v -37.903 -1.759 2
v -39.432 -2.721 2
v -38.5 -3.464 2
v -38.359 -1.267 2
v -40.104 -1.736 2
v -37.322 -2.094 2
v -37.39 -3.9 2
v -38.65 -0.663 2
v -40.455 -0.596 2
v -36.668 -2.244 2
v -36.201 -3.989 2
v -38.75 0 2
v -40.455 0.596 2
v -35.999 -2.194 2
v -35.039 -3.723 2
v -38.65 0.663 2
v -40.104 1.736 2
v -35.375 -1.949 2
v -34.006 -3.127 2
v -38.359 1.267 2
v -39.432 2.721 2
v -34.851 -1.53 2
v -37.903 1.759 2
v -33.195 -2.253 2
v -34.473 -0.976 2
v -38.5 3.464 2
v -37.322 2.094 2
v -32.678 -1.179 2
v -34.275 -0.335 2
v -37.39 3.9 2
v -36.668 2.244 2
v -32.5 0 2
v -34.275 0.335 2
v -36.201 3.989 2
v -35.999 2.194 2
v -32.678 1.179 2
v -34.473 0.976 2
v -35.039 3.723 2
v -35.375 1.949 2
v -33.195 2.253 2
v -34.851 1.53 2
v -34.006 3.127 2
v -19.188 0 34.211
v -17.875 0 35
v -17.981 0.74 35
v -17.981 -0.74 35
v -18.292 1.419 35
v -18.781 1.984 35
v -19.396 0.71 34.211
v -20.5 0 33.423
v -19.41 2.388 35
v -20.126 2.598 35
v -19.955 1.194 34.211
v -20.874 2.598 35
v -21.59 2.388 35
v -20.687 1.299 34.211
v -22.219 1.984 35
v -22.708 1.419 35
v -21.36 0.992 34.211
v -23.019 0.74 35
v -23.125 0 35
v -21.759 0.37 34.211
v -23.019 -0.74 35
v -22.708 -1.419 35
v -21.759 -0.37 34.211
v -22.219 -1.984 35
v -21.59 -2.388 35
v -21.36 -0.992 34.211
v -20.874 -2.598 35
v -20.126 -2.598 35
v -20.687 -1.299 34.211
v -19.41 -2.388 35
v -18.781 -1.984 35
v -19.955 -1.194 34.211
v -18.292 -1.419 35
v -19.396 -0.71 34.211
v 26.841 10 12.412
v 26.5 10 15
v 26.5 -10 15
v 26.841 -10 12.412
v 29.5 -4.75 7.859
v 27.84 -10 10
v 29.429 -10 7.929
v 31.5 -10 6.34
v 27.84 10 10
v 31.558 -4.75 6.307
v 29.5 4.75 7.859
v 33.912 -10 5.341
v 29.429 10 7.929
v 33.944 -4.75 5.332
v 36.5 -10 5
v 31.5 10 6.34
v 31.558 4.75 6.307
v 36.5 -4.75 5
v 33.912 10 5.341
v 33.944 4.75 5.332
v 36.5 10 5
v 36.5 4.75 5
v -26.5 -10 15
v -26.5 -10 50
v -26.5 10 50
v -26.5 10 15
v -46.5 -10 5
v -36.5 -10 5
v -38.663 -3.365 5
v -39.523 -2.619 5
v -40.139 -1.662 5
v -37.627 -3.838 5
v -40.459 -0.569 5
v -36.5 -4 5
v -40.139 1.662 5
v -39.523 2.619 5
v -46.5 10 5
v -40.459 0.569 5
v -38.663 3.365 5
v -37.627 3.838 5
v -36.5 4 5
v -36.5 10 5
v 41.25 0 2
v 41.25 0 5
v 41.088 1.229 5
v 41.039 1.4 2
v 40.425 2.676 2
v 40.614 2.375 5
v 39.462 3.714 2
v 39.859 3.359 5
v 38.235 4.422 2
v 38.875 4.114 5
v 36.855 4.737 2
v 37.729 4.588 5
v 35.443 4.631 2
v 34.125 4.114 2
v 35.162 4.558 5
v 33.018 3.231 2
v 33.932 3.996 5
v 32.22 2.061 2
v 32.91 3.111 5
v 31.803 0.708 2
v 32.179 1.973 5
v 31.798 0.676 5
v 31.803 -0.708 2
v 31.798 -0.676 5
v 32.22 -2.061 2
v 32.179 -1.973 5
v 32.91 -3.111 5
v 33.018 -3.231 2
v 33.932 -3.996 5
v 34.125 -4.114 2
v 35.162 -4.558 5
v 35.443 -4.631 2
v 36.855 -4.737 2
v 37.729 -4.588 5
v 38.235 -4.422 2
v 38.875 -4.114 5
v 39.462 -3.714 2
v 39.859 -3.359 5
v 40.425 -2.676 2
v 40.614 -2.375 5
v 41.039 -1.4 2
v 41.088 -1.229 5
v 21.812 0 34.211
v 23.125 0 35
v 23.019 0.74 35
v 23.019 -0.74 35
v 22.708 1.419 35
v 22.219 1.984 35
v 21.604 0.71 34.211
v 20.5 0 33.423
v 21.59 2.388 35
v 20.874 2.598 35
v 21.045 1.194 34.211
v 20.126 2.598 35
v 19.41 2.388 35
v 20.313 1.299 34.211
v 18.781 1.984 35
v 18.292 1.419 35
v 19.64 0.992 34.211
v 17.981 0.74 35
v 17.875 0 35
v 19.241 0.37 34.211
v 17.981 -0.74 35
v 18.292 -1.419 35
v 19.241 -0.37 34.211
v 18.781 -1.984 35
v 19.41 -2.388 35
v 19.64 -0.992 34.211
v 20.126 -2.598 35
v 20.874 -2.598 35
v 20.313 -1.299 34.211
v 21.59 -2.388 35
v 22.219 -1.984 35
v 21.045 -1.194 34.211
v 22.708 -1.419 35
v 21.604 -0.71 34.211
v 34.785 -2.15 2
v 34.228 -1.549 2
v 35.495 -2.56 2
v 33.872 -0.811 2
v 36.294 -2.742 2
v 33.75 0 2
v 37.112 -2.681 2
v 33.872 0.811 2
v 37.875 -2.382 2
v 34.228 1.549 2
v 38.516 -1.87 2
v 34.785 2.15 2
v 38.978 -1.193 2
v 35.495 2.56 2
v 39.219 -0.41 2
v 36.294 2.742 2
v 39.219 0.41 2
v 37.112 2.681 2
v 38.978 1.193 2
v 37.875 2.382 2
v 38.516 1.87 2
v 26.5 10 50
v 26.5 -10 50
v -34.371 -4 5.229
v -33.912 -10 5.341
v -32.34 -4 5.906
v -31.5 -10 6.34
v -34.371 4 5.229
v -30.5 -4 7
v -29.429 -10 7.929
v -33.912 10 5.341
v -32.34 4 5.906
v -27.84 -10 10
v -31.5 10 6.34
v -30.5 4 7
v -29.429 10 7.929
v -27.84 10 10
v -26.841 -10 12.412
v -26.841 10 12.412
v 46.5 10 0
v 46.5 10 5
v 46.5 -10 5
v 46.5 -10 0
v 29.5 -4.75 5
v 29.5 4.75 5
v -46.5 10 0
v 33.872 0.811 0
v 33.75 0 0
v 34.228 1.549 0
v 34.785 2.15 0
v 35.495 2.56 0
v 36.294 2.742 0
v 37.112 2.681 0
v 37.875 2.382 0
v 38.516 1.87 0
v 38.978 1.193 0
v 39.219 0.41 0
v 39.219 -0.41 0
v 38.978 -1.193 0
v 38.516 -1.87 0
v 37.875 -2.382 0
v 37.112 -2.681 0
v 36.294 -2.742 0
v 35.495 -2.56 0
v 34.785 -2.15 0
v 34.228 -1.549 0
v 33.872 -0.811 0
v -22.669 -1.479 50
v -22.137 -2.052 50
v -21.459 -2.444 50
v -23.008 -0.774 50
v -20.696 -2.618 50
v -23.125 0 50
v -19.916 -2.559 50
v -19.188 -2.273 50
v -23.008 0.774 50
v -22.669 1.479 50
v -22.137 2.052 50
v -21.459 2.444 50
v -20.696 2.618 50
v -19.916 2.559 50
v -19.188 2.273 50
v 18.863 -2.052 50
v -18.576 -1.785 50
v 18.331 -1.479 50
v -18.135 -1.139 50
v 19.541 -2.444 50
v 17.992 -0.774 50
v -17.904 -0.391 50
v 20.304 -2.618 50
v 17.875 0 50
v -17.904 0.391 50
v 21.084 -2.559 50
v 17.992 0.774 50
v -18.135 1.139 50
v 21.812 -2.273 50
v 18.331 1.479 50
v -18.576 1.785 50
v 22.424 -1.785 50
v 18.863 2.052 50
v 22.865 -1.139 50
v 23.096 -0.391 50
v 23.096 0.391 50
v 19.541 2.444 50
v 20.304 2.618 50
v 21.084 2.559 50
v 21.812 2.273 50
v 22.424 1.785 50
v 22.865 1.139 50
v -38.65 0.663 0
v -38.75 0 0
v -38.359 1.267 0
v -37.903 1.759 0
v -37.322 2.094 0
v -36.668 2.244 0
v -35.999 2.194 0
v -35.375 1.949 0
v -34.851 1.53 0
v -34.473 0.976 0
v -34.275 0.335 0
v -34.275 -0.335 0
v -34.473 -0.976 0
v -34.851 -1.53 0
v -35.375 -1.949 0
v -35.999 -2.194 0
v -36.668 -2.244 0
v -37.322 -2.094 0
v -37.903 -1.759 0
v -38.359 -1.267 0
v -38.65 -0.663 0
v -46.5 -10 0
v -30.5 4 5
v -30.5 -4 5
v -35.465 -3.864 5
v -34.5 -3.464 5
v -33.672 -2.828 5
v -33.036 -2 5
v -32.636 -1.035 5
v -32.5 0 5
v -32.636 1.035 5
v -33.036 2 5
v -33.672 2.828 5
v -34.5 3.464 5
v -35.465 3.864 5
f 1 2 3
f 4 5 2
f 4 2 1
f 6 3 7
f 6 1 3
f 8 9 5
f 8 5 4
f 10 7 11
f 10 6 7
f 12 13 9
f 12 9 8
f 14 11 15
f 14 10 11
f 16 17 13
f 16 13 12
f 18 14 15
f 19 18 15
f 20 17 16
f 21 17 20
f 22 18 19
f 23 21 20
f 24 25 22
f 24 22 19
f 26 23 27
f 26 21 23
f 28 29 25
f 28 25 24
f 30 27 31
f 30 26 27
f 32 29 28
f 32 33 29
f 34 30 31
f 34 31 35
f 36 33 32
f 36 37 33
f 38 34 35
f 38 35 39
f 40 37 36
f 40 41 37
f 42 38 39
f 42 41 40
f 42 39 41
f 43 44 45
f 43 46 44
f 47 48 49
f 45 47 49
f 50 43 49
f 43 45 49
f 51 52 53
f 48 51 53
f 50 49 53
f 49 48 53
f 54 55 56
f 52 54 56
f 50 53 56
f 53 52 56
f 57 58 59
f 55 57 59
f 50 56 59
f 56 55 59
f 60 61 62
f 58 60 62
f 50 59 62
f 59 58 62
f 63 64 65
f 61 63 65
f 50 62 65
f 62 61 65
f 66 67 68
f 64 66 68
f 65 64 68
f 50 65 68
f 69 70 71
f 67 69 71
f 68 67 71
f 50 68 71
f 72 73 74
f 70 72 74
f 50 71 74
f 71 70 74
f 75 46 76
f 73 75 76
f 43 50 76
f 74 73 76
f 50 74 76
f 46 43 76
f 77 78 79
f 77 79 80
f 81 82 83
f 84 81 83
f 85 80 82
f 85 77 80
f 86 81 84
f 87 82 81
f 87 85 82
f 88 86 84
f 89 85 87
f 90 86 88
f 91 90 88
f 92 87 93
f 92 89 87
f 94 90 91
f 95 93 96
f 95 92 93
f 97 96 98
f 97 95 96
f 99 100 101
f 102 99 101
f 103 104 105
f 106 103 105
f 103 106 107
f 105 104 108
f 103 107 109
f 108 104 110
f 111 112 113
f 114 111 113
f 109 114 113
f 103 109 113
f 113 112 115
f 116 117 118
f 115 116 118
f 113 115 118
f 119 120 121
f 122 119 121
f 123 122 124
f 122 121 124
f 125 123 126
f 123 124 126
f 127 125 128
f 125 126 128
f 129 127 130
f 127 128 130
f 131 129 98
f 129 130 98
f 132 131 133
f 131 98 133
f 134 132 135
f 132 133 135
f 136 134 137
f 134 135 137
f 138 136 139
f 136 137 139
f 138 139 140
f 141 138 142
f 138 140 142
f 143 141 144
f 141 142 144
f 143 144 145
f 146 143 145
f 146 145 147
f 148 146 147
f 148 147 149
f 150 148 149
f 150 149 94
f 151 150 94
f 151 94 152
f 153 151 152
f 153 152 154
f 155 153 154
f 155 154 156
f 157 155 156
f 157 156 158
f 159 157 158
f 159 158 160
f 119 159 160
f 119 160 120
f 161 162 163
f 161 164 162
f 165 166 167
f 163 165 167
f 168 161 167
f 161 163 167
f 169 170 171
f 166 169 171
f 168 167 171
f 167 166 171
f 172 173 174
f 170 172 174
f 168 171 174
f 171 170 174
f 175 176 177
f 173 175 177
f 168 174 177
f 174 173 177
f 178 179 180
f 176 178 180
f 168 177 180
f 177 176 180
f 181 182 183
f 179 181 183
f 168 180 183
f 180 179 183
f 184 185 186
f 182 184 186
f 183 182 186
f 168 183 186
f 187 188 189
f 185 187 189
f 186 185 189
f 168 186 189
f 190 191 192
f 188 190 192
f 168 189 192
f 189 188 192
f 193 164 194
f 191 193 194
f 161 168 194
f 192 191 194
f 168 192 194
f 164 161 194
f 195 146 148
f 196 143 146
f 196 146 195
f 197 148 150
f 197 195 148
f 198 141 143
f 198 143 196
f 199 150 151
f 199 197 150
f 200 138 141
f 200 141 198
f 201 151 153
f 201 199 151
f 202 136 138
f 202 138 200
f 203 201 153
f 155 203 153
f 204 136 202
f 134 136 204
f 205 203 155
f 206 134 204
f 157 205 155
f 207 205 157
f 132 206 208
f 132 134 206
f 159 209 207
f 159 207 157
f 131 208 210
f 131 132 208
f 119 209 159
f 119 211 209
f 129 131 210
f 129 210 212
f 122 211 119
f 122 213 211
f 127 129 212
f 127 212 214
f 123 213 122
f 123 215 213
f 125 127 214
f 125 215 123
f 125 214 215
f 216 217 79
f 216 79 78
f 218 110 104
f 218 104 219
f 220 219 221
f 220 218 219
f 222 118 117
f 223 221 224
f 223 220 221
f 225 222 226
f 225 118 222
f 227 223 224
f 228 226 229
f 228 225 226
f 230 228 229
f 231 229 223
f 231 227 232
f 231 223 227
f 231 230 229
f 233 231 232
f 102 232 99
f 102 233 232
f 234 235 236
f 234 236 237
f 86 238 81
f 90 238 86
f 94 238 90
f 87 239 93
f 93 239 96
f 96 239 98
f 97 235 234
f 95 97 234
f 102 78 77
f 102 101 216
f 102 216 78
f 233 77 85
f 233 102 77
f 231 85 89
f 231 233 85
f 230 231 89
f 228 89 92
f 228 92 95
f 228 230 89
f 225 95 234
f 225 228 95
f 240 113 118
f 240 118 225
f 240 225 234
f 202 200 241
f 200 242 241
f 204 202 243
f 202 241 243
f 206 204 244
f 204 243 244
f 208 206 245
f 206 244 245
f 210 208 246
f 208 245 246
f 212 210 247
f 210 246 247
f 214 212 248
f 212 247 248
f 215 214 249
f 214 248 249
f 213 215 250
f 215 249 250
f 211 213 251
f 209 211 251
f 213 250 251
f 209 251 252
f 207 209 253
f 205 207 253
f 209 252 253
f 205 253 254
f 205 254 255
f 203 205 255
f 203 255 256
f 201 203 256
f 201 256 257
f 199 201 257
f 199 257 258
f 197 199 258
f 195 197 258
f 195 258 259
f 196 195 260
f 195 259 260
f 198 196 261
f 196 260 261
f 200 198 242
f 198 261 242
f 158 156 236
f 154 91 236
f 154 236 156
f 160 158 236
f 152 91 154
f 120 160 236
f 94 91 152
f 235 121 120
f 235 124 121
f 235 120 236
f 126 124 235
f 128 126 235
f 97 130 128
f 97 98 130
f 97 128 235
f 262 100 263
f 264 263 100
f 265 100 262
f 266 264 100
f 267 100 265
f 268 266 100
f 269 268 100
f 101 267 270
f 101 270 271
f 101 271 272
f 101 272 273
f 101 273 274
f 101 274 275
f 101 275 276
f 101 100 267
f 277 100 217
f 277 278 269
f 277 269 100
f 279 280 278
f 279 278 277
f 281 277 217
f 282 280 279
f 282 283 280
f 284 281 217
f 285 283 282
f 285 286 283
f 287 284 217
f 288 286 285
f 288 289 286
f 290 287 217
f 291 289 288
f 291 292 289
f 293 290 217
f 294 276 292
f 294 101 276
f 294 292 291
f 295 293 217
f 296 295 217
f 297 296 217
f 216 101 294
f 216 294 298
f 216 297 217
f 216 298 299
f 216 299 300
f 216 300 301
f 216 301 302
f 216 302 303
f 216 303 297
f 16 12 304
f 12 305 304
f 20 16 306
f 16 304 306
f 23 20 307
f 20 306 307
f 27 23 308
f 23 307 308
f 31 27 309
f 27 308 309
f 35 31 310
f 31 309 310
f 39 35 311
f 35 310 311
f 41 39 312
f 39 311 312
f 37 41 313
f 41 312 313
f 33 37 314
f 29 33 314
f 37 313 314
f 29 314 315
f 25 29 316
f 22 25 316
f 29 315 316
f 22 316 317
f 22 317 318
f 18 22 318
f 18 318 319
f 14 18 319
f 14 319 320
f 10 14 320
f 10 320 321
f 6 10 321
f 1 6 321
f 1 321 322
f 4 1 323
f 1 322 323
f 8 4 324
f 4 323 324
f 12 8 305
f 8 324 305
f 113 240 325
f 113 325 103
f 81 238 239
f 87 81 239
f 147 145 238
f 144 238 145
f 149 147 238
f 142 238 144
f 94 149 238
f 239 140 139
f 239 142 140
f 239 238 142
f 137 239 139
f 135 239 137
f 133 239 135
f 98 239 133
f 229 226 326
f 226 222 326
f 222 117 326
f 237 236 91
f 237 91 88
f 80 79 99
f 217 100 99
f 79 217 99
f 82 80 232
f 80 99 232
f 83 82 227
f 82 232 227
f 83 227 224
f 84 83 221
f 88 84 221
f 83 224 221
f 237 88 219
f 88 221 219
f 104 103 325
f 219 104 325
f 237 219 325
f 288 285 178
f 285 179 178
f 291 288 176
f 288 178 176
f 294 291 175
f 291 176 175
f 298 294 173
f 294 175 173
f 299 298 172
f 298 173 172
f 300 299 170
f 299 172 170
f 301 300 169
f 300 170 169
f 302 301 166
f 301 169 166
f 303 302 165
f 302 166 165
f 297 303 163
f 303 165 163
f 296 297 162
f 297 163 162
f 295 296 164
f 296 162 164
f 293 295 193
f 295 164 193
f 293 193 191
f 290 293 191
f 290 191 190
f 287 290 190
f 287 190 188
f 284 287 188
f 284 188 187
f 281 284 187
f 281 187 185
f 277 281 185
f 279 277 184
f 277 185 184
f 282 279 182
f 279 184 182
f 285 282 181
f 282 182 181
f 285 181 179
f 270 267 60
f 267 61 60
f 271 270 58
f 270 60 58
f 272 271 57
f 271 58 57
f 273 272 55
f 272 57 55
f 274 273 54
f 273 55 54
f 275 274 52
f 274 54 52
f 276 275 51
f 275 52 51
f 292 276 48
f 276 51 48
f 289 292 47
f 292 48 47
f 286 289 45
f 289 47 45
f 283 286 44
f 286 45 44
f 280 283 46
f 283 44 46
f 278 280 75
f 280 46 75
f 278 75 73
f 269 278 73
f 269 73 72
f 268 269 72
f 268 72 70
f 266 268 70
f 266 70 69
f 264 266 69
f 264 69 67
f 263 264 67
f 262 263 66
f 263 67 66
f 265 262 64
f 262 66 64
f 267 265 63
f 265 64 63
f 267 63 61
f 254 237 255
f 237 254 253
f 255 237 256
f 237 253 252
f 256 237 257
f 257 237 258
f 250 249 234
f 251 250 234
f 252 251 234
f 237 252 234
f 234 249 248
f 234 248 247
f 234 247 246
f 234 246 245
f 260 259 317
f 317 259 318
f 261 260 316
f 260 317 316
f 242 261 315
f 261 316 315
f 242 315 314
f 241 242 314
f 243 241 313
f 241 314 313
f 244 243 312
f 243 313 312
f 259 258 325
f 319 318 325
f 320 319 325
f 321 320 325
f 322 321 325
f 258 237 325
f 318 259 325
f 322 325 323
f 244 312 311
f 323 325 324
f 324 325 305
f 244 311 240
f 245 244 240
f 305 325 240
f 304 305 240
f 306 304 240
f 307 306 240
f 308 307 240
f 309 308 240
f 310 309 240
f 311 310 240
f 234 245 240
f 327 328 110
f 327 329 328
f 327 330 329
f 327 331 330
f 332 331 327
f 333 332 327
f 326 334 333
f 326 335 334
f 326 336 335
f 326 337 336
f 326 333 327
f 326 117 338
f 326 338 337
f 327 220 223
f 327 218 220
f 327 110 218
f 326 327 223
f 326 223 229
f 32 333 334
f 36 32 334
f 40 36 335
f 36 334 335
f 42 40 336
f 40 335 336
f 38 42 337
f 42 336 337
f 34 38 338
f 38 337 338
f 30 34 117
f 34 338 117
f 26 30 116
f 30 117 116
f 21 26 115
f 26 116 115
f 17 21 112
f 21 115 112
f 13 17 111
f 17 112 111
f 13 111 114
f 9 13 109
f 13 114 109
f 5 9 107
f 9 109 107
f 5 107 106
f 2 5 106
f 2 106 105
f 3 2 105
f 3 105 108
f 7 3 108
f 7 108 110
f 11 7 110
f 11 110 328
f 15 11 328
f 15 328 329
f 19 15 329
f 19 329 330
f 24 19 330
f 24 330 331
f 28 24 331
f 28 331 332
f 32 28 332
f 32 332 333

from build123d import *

# Parameters (mm, degrees)
SKETCH_1_W                     = 53
SKETCH_1_H                     = 20
EXTRUDE_1_DEPTH                = 50
HOLE_WIZARD_M5_1_D             = 5.25
HOLE_WIZARD_M5_1_DEPTH         = 15
HOLE_WIZARD_M5_1_TIP           = 1.577259125
SKETCH_4_W                     = 5
SKETCH_4_H                     = 20
EXTRUDE_2_DEPTH                = 20
HOLE_WIZARD_M4_1_D             = 4.5
HOLE_WIZARD_M4_1_DEPTH         = 15
HOLE_WIZARD_M4_1_CBORE_D       = 8
HOLE_WIZARD_M4_1_CBORE_DEPTH   = 3
HOLE_WIZARD_M4_1_TIP           = 1.351936393
SKETCH_7_W                     = 5
SKETCH_7_H                     = 20
EXTRUDE_3_DEPTH                = 20
HOLE_WIZARD_M5_1_2_D           = 5.5
HOLE_WIZARD_M5_1_2_DEPTH       = 15
HOLE_WIZARD_M5_1_2_CBORE_D     = 9.5
HOLE_WIZARD_M5_1_2_CBORE_DEPTH = 3
HOLE_WIZARD_M5_1_2_TIP         = 1.652366702
FILLET_1_R                     = 10
SKETCH_10_W                    = 6
SKETCH_10_H                    = 8
SKETCH_10_W_2                  = 7
SKETCH_10_H_2                  = 9.5
CUT_EXTRUDE_1_DEPTH            = 20


with BuildPart() as part:
    # 스케치1 → 보스-돌출1 (new body)
    with BuildSketch(Plane.XY):
        Rectangle(SKETCH_1_W, SKETCH_1_H)
    extrude(amount=EXTRUDE_1_DEPTH)

    # Hole Wizard M5 _ _1
    with Locations(Plane.XY.offset(50)):
        with Locations((20.5, 0), (-20.5, 0)):
            Hole(HOLE_WIZARD_M5_1_D / 2, depth=HOLE_WIZARD_M5_1_DEPTH)
            with Locations((0, 0, -(HOLE_WIZARD_M5_1_DEPTH + HOLE_WIZARD_M5_1_TIP / 2))):  # 118° drill point
                Cone(0, HOLE_WIZARD_M5_1_D / 2, HOLE_WIZARD_M5_1_TIP, mode=Mode.SUBTRACT)

    # 스케치4 → 보스-돌출2 (add)
    with BuildSketch(Plane.ZY.offset(26.5)):
        with Locations((2.5, 0)):
            Rectangle(SKETCH_4_W, SKETCH_4_H)
    extrude(amount=EXTRUDE_2_DEPTH)

    # M4 소켓 머리 캡 나사용 카운터보어1
    with Locations(Plane.XY.offset(5)):
        with Locations((-36.5, 0)):
            CounterBoreHole(HOLE_WIZARD_M4_1_D / 2, HOLE_WIZARD_M4_1_CBORE_D / 2, HOLE_WIZARD_M4_1_CBORE_DEPTH, depth=HOLE_WIZARD_M4_1_DEPTH)
            with Locations((0, 0, -(HOLE_WIZARD_M4_1_DEPTH + HOLE_WIZARD_M4_1_TIP / 2))):  # 118° drill point
                Cone(0, HOLE_WIZARD_M4_1_D / 2, HOLE_WIZARD_M4_1_TIP, mode=Mode.SUBTRACT)

    # 스케치7 → 보스-돌출3 (add)
    with BuildSketch(Plane(origin=(26.5, 0, 0), x_dir=(0, 0, -1), z_dir=(1, 0, 0))):
        with Locations((-2.5, 0)):
            Rectangle(SKETCH_7_W, SKETCH_7_H)
    extrude(amount=EXTRUDE_3_DEPTH)

    # Hole Wizard M5 _ _ _ _ _1 2
    with Locations(Plane.XY.offset(5)):
        with Locations((36.5, 0)):
            CounterBoreHole(HOLE_WIZARD_M5_1_2_D / 2, HOLE_WIZARD_M5_1_2_CBORE_D / 2, HOLE_WIZARD_M5_1_2_CBORE_DEPTH, depth=HOLE_WIZARD_M5_1_2_DEPTH)
            with Locations((0, 0, -(HOLE_WIZARD_M5_1_2_DEPTH + HOLE_WIZARD_M5_1_2_TIP / 2))):  # 118° drill point
                Cone(0, HOLE_WIZARD_M5_1_2_D / 2, HOLE_WIZARD_M5_1_2_TIP, mode=Mode.SUBTRACT)

    # 필렛1
    # the kernel refuses this fillet: 10 mm, written as the material it adds along each edge
    with BuildSketch(Plane(origin=(-26.5, 10, 5), x_dir=(0, 0, 1), z_dir=(0, -1, 0))) as fillet_1_piece_1_section:
        with BuildLine():
            CenterArc((FILLET_1_R, FILLET_1_R), FILLET_1_R, 180, 90)
            Line((0, FILLET_1_R), (0, 0))
            Line((0, 0), (FILLET_1_R, 0))
        make_face()
    fillet_1_piece_1 = extrude(amount=20, mode=Mode.PRIVATE)
    fillet_1_piece_1 = fillet_1_piece_1 - Plane(origin=(-36.5, 0, 7.308851988), x_dir=(1, 0, 0), z_dir=(0, 0, 1)) * Cylinder(4, 81, mode=Mode.PRIVATE)
    add(fillet_1_piece_1)
    with BuildSketch(Plane(origin=(26.5, 10, 5), x_dir=(0, 0, 1), z_dir=(0, -1, 0))) as fillet_1_piece_2_section:
        with BuildLine():
            CenterArc((FILLET_1_R, -FILLET_1_R), FILLET_1_R, 90, 90)
            Line((0, -FILLET_1_R), (0, 0))
            Line((0, 0), (FILLET_1_R, 0))
        make_face()
    fillet_1_piece_2 = extrude(amount=20, mode=Mode.PRIVATE)
    fillet_1_piece_2 = fillet_1_piece_2 - Plane(origin=(36.5, 0, 7.33913119), x_dir=(1, 0, 0), z_dir=(0, 0, 1)) * Cylinder(4.75, 80, mode=Mode.PRIVATE)
    add(fillet_1_piece_2)

    # 스케치10 → 컷-돌출1 (cut)
    with BuildSketch(Plane.XY.offset(5)):
        with Locations((-33.5, 0)):
            Rectangle(SKETCH_10_W, SKETCH_10_H)
        with Locations((33, 0)):
            Rectangle(SKETCH_10_W_2, SKETCH_10_H_2)
    extrude(amount=CUT_EXTRUDE_1_DEPTH, mode=Mode.SUBTRACT)


solid = part.part
